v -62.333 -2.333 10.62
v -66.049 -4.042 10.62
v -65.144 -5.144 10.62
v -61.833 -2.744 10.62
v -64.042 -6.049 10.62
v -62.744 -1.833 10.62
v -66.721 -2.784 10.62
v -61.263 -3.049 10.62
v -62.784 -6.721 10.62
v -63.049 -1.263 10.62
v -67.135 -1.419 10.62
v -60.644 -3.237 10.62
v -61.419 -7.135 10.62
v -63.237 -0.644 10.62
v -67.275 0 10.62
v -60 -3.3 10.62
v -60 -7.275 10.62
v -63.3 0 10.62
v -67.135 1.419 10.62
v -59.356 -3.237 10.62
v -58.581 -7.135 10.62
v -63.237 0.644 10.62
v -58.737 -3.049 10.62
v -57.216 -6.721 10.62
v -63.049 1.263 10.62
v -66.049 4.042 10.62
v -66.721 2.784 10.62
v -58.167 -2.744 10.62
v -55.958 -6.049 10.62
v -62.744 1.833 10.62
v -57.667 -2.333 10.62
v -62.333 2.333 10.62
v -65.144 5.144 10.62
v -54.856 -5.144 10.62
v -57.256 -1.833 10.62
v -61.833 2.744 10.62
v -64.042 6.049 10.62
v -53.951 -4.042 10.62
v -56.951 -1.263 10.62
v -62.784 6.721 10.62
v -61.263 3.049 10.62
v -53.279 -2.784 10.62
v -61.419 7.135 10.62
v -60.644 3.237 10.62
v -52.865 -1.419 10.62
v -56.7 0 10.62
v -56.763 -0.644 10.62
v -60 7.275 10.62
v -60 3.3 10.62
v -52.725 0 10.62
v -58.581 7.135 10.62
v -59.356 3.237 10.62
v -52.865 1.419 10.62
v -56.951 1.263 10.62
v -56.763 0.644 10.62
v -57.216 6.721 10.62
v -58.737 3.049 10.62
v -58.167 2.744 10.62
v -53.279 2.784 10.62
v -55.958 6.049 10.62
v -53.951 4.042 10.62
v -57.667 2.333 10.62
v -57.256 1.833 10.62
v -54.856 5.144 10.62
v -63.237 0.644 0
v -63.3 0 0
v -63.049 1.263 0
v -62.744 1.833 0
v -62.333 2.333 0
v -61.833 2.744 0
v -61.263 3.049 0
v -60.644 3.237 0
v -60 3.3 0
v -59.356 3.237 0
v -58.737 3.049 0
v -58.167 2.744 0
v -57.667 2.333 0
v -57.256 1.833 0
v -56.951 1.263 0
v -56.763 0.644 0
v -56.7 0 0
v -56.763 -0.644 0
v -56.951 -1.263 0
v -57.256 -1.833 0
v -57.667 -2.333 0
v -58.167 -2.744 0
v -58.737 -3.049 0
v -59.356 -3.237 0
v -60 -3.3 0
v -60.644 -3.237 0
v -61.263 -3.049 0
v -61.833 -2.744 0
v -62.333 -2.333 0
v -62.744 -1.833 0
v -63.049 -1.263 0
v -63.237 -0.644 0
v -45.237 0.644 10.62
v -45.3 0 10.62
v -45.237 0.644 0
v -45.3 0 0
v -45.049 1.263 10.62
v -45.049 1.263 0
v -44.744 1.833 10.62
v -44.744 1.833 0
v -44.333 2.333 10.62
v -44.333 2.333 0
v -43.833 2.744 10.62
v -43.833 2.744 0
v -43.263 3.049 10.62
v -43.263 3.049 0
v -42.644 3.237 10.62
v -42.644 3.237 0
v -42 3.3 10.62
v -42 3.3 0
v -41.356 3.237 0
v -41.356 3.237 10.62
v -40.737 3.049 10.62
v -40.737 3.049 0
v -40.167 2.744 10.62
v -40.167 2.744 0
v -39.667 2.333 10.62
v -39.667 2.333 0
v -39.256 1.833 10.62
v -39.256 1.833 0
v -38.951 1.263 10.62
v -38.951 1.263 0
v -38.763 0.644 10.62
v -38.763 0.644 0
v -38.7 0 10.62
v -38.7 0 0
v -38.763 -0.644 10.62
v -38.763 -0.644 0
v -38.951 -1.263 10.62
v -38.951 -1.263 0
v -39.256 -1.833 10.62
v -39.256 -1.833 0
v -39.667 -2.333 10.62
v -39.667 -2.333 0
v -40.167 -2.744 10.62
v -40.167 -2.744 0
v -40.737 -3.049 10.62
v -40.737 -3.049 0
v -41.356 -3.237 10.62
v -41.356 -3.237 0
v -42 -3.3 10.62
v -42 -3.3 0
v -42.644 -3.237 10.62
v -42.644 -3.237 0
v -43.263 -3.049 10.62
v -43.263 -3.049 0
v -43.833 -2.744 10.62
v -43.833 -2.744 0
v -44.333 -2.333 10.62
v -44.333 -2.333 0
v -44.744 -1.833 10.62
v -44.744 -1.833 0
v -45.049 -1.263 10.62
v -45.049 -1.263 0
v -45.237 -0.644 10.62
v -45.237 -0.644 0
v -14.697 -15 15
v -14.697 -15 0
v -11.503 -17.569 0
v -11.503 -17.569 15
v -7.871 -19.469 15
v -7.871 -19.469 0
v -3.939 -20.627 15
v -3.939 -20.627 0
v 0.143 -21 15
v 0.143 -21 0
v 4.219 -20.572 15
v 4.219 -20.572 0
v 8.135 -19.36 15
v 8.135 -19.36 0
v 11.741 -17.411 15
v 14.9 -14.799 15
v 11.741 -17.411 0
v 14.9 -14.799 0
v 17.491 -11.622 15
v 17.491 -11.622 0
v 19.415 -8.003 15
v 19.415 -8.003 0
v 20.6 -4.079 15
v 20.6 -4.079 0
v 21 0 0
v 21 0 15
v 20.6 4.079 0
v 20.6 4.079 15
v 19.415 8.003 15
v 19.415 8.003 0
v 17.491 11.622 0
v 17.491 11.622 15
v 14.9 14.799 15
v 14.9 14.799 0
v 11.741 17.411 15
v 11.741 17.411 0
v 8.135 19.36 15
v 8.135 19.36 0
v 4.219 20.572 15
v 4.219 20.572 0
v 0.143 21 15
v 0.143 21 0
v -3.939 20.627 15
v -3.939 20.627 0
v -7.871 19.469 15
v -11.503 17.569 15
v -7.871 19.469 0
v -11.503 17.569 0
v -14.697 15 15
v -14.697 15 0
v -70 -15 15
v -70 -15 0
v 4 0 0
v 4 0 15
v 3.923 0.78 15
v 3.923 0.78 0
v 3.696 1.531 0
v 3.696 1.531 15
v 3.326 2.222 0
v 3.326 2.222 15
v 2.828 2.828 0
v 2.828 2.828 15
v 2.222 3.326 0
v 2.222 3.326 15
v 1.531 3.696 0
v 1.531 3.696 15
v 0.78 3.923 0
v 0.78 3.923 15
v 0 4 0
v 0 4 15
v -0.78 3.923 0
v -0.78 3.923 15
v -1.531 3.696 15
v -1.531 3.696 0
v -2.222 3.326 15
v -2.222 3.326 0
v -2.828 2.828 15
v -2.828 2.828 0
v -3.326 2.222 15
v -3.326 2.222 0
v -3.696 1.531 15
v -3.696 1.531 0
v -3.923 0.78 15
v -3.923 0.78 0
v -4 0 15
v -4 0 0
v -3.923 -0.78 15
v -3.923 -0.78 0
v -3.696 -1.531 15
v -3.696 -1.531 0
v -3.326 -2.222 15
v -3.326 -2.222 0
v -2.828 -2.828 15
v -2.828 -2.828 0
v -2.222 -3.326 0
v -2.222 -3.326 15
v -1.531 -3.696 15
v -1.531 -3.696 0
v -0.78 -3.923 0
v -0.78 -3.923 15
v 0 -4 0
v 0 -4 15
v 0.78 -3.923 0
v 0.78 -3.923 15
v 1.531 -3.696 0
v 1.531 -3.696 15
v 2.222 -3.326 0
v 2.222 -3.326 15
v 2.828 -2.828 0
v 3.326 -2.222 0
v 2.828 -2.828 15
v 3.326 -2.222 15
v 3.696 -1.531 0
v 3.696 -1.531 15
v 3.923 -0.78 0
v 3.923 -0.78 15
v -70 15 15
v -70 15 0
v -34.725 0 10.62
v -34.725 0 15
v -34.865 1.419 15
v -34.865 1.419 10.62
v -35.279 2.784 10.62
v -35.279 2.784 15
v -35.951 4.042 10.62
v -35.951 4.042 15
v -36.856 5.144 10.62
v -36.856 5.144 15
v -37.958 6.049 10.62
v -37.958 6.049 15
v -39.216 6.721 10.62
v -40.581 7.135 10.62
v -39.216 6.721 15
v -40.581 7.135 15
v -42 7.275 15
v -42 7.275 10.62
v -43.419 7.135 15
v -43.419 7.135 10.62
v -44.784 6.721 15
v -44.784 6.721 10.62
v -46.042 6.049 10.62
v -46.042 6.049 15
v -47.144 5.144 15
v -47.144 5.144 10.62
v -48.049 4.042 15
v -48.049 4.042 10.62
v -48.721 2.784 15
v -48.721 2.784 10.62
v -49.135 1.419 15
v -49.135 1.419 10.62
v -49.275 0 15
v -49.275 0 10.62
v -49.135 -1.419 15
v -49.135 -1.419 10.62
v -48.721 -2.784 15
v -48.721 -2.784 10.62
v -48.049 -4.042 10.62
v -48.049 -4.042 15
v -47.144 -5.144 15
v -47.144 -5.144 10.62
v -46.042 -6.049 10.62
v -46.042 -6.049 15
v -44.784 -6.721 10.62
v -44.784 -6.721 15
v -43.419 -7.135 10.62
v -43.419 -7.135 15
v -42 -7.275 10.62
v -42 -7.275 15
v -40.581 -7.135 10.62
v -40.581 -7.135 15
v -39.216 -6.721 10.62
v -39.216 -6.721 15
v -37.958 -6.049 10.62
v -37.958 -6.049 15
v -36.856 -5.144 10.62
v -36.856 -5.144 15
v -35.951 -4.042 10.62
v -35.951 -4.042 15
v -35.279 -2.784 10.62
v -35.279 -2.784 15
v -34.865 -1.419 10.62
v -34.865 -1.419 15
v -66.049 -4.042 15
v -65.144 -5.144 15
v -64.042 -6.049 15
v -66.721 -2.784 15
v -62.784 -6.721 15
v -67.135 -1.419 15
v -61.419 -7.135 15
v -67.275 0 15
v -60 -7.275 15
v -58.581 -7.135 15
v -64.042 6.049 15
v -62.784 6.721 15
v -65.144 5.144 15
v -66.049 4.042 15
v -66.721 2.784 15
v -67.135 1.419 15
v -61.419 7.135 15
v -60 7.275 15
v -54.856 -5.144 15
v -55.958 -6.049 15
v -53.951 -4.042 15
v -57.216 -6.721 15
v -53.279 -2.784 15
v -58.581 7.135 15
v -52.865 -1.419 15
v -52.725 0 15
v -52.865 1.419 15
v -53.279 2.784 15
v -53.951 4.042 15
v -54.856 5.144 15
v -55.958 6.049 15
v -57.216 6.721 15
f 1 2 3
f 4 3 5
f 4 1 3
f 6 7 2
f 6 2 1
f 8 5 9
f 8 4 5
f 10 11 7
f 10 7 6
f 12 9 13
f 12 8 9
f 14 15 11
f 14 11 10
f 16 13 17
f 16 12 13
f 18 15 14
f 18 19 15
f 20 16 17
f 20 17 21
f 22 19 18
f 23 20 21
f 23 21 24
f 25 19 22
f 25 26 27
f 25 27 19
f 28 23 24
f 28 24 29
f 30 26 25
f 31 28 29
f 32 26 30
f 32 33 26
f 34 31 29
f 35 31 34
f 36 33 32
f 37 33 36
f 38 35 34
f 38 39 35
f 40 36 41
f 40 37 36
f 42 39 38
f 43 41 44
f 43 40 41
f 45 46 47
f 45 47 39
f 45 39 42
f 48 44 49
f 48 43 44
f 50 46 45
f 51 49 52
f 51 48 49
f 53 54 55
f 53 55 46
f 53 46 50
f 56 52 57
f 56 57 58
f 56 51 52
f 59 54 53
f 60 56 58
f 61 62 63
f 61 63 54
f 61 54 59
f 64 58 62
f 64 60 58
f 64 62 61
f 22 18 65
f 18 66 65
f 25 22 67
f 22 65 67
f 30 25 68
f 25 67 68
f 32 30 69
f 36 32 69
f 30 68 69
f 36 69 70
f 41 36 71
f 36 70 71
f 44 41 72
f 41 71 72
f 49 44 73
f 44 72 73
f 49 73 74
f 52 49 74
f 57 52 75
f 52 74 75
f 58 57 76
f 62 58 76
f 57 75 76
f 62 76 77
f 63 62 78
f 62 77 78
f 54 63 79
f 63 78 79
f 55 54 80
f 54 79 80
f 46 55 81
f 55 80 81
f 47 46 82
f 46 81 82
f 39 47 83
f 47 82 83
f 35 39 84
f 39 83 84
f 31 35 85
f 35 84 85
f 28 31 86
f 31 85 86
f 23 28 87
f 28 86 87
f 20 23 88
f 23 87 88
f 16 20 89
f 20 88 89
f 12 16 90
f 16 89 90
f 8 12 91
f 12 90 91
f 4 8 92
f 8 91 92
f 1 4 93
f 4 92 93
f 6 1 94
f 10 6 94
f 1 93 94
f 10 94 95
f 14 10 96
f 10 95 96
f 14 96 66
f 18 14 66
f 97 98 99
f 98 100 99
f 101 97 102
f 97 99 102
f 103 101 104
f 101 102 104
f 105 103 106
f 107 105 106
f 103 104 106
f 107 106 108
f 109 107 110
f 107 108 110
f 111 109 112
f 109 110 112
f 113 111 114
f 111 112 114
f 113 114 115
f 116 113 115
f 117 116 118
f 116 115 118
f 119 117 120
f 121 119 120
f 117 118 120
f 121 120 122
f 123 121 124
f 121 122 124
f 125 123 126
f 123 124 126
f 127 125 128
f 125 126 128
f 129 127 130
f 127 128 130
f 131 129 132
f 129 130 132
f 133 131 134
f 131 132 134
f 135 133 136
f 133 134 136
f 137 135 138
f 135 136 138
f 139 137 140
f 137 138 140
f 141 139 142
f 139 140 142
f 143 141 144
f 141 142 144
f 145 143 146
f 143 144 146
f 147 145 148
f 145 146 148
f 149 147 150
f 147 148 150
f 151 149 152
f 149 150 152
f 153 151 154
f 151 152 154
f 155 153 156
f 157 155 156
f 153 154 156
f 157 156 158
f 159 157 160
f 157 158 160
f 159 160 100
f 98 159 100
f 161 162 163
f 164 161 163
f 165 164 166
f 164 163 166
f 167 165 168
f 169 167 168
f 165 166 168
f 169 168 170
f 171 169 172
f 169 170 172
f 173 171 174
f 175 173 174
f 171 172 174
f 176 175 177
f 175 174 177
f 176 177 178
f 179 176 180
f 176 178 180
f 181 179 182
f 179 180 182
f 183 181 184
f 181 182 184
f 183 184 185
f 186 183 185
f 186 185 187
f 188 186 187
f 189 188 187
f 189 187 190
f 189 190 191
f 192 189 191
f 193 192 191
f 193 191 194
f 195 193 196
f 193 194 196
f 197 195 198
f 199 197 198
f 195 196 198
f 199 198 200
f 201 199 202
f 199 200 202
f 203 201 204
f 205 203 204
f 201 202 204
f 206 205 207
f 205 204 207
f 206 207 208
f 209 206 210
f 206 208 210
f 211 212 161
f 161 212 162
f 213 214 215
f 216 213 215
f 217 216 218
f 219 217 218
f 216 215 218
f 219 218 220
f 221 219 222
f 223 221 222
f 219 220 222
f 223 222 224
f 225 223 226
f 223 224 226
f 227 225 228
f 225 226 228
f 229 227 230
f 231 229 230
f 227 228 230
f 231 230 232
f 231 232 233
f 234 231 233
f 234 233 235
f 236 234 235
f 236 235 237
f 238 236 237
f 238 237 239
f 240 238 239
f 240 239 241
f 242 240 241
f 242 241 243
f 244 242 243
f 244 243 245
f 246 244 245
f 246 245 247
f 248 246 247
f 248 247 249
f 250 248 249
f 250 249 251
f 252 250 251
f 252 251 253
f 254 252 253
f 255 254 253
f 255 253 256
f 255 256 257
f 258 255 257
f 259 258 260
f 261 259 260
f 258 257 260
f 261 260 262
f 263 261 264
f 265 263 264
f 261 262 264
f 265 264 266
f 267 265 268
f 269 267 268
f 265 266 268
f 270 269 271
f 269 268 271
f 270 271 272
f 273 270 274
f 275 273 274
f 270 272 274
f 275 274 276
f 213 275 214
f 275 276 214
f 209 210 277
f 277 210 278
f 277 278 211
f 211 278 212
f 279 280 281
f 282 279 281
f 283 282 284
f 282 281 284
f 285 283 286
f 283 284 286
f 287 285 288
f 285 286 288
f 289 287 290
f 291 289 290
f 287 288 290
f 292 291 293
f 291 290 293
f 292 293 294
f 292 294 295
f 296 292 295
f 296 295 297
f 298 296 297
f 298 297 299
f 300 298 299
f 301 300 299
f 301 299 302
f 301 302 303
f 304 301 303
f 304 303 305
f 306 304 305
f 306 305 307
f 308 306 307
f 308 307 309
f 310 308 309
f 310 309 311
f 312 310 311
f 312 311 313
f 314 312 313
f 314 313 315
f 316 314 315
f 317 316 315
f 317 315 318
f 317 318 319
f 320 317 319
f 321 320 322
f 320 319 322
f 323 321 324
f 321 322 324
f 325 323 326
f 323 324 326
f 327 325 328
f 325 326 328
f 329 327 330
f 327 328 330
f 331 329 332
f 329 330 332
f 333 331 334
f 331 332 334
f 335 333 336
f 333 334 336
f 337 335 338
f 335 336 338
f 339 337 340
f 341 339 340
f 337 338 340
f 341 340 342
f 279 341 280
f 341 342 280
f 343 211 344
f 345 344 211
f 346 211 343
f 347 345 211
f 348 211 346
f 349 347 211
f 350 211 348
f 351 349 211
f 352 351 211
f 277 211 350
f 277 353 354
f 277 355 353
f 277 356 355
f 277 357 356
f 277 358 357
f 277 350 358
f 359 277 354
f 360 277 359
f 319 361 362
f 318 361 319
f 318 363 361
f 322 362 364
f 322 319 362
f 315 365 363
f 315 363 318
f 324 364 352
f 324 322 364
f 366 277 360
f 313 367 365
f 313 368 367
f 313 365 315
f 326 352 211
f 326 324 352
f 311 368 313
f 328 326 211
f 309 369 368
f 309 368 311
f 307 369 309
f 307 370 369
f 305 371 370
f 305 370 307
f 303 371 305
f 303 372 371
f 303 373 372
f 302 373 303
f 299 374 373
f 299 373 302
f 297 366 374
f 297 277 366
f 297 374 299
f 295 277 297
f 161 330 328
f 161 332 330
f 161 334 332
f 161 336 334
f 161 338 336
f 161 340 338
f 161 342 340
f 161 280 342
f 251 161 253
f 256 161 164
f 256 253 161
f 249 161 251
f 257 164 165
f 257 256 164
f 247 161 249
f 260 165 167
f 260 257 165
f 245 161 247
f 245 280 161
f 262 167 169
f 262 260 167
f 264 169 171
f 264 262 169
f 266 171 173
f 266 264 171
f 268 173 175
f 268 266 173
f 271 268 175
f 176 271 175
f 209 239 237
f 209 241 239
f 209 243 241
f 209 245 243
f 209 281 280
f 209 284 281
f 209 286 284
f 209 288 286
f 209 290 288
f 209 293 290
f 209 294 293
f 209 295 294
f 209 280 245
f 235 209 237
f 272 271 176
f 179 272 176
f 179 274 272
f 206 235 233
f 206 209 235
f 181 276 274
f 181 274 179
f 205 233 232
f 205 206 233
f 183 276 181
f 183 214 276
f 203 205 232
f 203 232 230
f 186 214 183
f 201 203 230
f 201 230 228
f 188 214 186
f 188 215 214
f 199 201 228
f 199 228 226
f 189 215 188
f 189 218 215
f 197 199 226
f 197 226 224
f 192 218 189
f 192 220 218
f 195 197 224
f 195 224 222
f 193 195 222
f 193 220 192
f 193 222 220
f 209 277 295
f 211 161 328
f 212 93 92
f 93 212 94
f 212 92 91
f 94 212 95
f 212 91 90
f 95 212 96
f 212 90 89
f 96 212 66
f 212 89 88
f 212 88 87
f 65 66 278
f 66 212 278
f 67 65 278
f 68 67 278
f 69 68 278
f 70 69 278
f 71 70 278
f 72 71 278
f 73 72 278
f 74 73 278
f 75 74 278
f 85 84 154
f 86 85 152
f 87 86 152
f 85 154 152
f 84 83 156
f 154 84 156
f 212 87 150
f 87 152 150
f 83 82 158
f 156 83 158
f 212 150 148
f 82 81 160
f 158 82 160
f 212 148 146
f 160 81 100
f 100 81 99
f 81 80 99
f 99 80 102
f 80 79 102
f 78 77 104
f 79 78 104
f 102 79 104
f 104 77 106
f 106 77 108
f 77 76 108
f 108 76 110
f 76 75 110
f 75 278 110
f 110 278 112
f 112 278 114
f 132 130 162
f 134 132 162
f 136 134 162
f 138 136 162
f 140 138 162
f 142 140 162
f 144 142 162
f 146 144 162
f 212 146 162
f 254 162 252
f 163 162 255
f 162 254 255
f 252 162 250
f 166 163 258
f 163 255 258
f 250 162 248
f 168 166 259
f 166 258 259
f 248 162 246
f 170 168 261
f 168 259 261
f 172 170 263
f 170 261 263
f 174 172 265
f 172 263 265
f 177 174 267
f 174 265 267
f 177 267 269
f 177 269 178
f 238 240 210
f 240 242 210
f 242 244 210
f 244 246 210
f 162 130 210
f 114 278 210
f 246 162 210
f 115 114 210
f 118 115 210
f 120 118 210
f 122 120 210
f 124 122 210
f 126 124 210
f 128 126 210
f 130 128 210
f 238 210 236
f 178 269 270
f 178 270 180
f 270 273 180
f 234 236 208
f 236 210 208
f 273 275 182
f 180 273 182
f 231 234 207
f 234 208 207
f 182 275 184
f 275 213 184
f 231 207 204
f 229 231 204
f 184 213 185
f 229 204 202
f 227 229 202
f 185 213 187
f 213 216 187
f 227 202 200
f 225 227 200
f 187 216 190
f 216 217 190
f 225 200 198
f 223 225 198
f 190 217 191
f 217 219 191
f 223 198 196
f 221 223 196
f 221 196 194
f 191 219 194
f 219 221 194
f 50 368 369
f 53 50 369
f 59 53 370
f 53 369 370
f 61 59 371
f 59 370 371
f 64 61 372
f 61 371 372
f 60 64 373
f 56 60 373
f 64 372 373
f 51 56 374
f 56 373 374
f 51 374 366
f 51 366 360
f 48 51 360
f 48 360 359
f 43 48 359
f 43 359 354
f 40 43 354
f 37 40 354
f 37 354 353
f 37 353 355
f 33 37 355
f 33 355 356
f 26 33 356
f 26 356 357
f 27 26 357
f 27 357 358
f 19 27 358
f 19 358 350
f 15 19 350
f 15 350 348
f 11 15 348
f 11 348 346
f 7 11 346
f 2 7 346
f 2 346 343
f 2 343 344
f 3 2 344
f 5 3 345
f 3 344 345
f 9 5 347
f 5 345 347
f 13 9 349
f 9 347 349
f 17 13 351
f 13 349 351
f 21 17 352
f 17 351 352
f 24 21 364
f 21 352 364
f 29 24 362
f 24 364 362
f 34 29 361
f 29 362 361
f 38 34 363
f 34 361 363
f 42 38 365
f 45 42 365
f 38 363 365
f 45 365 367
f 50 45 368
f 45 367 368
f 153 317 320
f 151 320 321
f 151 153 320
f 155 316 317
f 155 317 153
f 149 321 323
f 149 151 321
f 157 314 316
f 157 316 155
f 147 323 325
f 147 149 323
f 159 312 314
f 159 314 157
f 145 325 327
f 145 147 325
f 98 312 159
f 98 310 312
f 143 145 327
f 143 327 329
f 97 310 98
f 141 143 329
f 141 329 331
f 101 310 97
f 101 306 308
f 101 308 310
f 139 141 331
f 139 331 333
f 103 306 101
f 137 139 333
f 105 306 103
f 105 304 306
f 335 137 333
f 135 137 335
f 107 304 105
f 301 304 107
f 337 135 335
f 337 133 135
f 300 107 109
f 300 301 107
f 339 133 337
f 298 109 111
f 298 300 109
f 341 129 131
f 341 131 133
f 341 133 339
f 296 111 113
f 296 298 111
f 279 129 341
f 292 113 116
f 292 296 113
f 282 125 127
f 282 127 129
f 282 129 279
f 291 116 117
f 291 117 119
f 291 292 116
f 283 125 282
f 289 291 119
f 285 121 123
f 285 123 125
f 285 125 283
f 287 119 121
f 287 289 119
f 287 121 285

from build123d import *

# Parameters (mm, degrees)
BOSS_EXTRUDE1_DEPTH                     = 15
CBORE_FOR_M6_HEX_HEAD_BOLT1_D           = 6.6
CBORE_FOR_M6_HEX_HEAD_BOLT1_CBORE_D     = 14.55
CBORE_FOR_M6_HEX_HEAD_BOLT1_CBORE_DEPTH = 4.38
CUT_EXTRUDE1_REACH                      = 76.606
SKETCH4_R                               = 4


with BuildPart() as part:
    # Sketch1 → Boss-Extrude1 (new body)
    with BuildSketch(Plane.XY):
        with BuildLine():
            Line((-14.696938457, 15), (-70, 15))
            Line((-70, 15), (-70, -15))
            Line((-70, -15), (-14.696938457, -15))
            ThreePointArc((-14.696938457, -15), (21, 0), (-14.696938457, 15))
        make_face()
    extrude(amount=BOSS_EXTRUDE1_DEPTH)

    # CBORE for M6 Hex Head Bolt1 (through all)
    with Locations(Plane.XY.offset(15)):
        with Locations((-60, 0), (-42, 0)):
            CounterBoreHole(CBORE_FOR_M6_HEX_HEAD_BOLT1_D / 2, CBORE_FOR_M6_HEX_HEAD_BOLT1_CBORE_D / 2, CBORE_FOR_M6_HEX_HEAD_BOLT1_CBORE_DEPTH)

    # Sketch4 → Cut-Extrude1 (cut, up to next)
    with BuildSketch(Plane.XY.offset(15), mode=Mode.PRIVATE) as cut_extrude1_sk1:
        Circle(SKETCH4_R)
    cut_extrude1_tool1 = extrude(cut_extrude1_sk1.sketch, amount=-CUT_EXTRUDE1_REACH, mode=Mode.PRIVATE) & part.part
    add(cut_extrude1_tool1.solids().sort_by_distance((0, 0, 15))[0], mode=Mode.SUBTRACT)


solid = part.part
